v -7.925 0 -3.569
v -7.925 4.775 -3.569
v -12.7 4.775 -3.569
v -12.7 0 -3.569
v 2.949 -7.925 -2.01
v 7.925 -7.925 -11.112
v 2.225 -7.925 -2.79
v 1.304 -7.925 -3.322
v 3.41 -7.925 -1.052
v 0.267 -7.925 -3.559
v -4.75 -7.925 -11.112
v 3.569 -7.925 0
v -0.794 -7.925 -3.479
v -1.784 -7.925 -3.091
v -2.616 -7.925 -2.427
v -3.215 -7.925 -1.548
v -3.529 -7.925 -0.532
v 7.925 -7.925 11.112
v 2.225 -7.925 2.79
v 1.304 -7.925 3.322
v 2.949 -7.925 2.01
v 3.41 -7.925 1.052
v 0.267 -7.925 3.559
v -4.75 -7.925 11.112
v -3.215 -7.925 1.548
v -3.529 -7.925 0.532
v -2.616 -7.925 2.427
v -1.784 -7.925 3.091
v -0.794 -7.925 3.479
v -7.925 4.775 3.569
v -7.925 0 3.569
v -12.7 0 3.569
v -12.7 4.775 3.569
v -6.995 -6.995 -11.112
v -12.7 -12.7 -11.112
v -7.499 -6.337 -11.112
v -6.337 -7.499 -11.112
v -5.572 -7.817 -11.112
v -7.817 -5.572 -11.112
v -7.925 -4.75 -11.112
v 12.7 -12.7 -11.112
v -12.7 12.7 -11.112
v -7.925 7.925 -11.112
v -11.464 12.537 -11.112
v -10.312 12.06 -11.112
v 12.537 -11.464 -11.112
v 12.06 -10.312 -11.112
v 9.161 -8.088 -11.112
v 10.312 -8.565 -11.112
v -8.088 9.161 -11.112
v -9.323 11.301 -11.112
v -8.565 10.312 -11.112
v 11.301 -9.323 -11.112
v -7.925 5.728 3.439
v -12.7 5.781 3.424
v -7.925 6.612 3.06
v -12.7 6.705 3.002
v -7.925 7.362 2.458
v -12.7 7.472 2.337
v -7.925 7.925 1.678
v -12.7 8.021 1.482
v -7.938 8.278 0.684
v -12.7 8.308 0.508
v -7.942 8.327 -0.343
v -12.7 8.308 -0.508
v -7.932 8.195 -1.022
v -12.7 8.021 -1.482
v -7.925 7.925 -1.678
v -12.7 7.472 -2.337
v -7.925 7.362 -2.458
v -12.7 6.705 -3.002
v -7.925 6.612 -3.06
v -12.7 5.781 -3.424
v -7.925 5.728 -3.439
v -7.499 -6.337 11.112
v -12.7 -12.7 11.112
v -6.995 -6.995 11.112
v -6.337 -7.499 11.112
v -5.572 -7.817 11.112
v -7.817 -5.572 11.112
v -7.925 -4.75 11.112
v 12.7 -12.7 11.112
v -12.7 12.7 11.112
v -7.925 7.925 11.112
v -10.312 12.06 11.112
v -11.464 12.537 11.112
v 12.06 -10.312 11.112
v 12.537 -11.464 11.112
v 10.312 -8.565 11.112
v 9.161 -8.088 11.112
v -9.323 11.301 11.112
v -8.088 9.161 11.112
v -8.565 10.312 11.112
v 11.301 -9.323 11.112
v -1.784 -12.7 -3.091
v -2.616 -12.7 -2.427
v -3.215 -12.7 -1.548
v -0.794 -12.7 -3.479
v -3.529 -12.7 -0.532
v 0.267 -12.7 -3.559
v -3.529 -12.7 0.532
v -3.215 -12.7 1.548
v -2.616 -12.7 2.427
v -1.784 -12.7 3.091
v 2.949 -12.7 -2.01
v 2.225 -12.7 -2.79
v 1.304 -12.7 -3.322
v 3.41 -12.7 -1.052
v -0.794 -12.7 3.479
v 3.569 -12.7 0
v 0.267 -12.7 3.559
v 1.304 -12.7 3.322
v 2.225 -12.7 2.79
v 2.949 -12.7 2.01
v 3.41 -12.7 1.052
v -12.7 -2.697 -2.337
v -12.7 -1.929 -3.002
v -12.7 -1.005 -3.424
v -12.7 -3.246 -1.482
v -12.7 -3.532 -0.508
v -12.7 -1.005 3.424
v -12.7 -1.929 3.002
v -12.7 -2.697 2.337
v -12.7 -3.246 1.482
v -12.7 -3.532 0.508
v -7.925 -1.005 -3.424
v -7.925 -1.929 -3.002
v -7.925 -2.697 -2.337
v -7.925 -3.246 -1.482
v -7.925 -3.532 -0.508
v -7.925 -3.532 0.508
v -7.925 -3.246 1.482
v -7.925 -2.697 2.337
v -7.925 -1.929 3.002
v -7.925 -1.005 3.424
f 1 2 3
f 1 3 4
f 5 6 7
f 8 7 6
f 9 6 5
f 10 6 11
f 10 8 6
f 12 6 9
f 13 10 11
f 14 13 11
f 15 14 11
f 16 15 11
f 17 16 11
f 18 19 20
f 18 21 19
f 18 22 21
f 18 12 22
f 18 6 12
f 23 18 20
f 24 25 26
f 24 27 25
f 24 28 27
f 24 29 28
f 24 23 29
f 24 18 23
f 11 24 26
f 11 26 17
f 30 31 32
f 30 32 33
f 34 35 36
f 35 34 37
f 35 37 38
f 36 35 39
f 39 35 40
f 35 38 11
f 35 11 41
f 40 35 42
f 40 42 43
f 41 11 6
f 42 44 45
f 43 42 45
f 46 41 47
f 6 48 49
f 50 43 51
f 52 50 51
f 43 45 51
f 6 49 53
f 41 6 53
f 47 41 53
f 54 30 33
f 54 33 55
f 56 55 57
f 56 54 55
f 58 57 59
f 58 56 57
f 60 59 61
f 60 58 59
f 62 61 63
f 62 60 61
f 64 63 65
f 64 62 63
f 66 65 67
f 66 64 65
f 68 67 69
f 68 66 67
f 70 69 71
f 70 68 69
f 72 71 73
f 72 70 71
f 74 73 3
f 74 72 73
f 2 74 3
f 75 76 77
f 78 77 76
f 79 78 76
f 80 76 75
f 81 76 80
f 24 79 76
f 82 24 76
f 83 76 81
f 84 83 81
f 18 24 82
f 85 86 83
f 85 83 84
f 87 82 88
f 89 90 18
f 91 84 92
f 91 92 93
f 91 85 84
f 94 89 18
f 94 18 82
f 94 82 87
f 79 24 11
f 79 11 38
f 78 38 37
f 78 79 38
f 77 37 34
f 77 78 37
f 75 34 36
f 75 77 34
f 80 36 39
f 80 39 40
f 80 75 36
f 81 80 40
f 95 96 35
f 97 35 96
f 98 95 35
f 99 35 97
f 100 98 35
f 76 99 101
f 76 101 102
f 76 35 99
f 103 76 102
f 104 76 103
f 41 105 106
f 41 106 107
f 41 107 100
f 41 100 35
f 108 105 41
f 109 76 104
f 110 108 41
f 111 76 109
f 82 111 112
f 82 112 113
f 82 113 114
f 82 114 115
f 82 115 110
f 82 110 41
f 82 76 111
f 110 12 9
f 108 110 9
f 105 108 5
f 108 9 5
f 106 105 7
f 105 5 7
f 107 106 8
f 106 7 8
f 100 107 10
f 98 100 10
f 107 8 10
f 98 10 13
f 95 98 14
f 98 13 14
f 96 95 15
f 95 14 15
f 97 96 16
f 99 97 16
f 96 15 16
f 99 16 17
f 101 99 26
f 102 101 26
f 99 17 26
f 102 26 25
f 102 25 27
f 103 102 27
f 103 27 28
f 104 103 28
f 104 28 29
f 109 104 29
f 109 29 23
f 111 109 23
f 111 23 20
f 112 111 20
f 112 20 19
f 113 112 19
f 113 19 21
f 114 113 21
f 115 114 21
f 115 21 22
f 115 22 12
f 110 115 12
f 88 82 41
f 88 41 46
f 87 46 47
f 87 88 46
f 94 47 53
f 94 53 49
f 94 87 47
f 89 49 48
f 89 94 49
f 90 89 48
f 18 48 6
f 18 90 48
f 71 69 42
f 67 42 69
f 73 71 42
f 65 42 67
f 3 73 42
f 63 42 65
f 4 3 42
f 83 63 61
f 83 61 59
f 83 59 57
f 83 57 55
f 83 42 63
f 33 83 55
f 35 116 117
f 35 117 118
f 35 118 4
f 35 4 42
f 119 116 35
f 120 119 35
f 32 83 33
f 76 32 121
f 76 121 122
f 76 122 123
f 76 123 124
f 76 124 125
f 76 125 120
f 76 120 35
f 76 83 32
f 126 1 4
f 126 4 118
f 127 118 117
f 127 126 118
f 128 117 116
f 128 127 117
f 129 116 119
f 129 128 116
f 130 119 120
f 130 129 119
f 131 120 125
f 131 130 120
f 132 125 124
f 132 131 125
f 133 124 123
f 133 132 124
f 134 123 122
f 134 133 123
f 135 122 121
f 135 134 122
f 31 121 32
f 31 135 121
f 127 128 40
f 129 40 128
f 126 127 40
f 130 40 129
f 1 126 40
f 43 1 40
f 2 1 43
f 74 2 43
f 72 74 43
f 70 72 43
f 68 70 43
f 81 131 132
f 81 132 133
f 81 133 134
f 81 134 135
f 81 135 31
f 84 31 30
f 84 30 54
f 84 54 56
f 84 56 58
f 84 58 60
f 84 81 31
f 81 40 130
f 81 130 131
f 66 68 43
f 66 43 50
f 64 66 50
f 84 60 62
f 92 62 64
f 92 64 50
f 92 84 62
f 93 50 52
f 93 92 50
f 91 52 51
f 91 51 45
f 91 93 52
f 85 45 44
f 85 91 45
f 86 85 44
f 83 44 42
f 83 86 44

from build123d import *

# Parameters (mm, degrees)
BOSS_EXTRUDE1_DEPTH      = 11.1125
BOSS_EXTRUDE1_DEPTH_BACK = 11.1125
CUT_EXTRUDE1_DEPTH       = 21.6248
CUT_EXTRUDE1_DEPTH_BACK  = 5.7752
SKETCH6_R                = 3.5687
CUT_EXTRUDE2_DEPTH       = 5.7752


with BuildPart() as part:
    # Sketch4 → Boss-Extrude1 (new body, two sides)
    with BuildSketch(Plane.XY) as boss_extrude1_sk:
        with BuildLine():
            Line((-12.7, 12.7), (-12.7, -12.7))
            Line((-12.7, -12.7), (12.7, -12.7))
            ThreePointArc((12.7, -12.7), (11.301376302, -9.323423698), (7.9248, -7.9248))
            Line((7.9248, -7.9248), (-4.7498, -7.9248))
            ThreePointArc((-4.7498, -7.9248), (-6.99486403, -6.99486403), (-7.9248, -4.7498))
            Line((-7.9248, -4.7498), (-7.9248, 7.9248))
            ThreePointArc((-7.9248, 7.9248), (-9.323423698, 11.301376302), (-12.7, 12.7))
        make_face()
    extrude(amount=BOSS_EXTRUDE1_DEPTH)
    extrude(boss_extrude1_sk.sketch, amount=-BOSS_EXTRUDE1_DEPTH_BACK)

    # Sketch5 → Cut-Extrude1 (cut, two sides)
    with BuildSketch(Plane(origin=(-7.9248, 0, 0), x_dir=(0, 0, -1), z_dir=(1, 0, 0))) as cut_extrude1_sk:
        with BuildLine():
            Line((3.5687, 4.7752), (3.5687, 0))
            ThreePointArc((3.5687, 0), (0, -3.5687), (-3.5687, 0))
            Line((-3.5687, 0), (-3.5687, 4.7752))
            ThreePointArc((-3.5687, 4.7752), (0, 8.3439), (3.5687, 4.7752))
        make_face()
    extrude(amount=CUT_EXTRUDE1_DEPTH, mode=Mode.SUBTRACT)
    extrude(cut_extrude1_sk.sketch, amount=-CUT_EXTRUDE1_DEPTH_BACK, mode=Mode.SUBTRACT)

    # Sketch6 → Cut-Extrude2 (cut, through all)
    with BuildSketch(Plane(origin=(0, -7.9248, 0), x_dir=(1, 0, 0), z_dir=(0, 1, 0))):
        Circle(SKETCH6_R)
    extrude(amount=-CUT_EXTRUDE2_DEPTH, mode=Mode.SUBTRACT)


solid = part.part
